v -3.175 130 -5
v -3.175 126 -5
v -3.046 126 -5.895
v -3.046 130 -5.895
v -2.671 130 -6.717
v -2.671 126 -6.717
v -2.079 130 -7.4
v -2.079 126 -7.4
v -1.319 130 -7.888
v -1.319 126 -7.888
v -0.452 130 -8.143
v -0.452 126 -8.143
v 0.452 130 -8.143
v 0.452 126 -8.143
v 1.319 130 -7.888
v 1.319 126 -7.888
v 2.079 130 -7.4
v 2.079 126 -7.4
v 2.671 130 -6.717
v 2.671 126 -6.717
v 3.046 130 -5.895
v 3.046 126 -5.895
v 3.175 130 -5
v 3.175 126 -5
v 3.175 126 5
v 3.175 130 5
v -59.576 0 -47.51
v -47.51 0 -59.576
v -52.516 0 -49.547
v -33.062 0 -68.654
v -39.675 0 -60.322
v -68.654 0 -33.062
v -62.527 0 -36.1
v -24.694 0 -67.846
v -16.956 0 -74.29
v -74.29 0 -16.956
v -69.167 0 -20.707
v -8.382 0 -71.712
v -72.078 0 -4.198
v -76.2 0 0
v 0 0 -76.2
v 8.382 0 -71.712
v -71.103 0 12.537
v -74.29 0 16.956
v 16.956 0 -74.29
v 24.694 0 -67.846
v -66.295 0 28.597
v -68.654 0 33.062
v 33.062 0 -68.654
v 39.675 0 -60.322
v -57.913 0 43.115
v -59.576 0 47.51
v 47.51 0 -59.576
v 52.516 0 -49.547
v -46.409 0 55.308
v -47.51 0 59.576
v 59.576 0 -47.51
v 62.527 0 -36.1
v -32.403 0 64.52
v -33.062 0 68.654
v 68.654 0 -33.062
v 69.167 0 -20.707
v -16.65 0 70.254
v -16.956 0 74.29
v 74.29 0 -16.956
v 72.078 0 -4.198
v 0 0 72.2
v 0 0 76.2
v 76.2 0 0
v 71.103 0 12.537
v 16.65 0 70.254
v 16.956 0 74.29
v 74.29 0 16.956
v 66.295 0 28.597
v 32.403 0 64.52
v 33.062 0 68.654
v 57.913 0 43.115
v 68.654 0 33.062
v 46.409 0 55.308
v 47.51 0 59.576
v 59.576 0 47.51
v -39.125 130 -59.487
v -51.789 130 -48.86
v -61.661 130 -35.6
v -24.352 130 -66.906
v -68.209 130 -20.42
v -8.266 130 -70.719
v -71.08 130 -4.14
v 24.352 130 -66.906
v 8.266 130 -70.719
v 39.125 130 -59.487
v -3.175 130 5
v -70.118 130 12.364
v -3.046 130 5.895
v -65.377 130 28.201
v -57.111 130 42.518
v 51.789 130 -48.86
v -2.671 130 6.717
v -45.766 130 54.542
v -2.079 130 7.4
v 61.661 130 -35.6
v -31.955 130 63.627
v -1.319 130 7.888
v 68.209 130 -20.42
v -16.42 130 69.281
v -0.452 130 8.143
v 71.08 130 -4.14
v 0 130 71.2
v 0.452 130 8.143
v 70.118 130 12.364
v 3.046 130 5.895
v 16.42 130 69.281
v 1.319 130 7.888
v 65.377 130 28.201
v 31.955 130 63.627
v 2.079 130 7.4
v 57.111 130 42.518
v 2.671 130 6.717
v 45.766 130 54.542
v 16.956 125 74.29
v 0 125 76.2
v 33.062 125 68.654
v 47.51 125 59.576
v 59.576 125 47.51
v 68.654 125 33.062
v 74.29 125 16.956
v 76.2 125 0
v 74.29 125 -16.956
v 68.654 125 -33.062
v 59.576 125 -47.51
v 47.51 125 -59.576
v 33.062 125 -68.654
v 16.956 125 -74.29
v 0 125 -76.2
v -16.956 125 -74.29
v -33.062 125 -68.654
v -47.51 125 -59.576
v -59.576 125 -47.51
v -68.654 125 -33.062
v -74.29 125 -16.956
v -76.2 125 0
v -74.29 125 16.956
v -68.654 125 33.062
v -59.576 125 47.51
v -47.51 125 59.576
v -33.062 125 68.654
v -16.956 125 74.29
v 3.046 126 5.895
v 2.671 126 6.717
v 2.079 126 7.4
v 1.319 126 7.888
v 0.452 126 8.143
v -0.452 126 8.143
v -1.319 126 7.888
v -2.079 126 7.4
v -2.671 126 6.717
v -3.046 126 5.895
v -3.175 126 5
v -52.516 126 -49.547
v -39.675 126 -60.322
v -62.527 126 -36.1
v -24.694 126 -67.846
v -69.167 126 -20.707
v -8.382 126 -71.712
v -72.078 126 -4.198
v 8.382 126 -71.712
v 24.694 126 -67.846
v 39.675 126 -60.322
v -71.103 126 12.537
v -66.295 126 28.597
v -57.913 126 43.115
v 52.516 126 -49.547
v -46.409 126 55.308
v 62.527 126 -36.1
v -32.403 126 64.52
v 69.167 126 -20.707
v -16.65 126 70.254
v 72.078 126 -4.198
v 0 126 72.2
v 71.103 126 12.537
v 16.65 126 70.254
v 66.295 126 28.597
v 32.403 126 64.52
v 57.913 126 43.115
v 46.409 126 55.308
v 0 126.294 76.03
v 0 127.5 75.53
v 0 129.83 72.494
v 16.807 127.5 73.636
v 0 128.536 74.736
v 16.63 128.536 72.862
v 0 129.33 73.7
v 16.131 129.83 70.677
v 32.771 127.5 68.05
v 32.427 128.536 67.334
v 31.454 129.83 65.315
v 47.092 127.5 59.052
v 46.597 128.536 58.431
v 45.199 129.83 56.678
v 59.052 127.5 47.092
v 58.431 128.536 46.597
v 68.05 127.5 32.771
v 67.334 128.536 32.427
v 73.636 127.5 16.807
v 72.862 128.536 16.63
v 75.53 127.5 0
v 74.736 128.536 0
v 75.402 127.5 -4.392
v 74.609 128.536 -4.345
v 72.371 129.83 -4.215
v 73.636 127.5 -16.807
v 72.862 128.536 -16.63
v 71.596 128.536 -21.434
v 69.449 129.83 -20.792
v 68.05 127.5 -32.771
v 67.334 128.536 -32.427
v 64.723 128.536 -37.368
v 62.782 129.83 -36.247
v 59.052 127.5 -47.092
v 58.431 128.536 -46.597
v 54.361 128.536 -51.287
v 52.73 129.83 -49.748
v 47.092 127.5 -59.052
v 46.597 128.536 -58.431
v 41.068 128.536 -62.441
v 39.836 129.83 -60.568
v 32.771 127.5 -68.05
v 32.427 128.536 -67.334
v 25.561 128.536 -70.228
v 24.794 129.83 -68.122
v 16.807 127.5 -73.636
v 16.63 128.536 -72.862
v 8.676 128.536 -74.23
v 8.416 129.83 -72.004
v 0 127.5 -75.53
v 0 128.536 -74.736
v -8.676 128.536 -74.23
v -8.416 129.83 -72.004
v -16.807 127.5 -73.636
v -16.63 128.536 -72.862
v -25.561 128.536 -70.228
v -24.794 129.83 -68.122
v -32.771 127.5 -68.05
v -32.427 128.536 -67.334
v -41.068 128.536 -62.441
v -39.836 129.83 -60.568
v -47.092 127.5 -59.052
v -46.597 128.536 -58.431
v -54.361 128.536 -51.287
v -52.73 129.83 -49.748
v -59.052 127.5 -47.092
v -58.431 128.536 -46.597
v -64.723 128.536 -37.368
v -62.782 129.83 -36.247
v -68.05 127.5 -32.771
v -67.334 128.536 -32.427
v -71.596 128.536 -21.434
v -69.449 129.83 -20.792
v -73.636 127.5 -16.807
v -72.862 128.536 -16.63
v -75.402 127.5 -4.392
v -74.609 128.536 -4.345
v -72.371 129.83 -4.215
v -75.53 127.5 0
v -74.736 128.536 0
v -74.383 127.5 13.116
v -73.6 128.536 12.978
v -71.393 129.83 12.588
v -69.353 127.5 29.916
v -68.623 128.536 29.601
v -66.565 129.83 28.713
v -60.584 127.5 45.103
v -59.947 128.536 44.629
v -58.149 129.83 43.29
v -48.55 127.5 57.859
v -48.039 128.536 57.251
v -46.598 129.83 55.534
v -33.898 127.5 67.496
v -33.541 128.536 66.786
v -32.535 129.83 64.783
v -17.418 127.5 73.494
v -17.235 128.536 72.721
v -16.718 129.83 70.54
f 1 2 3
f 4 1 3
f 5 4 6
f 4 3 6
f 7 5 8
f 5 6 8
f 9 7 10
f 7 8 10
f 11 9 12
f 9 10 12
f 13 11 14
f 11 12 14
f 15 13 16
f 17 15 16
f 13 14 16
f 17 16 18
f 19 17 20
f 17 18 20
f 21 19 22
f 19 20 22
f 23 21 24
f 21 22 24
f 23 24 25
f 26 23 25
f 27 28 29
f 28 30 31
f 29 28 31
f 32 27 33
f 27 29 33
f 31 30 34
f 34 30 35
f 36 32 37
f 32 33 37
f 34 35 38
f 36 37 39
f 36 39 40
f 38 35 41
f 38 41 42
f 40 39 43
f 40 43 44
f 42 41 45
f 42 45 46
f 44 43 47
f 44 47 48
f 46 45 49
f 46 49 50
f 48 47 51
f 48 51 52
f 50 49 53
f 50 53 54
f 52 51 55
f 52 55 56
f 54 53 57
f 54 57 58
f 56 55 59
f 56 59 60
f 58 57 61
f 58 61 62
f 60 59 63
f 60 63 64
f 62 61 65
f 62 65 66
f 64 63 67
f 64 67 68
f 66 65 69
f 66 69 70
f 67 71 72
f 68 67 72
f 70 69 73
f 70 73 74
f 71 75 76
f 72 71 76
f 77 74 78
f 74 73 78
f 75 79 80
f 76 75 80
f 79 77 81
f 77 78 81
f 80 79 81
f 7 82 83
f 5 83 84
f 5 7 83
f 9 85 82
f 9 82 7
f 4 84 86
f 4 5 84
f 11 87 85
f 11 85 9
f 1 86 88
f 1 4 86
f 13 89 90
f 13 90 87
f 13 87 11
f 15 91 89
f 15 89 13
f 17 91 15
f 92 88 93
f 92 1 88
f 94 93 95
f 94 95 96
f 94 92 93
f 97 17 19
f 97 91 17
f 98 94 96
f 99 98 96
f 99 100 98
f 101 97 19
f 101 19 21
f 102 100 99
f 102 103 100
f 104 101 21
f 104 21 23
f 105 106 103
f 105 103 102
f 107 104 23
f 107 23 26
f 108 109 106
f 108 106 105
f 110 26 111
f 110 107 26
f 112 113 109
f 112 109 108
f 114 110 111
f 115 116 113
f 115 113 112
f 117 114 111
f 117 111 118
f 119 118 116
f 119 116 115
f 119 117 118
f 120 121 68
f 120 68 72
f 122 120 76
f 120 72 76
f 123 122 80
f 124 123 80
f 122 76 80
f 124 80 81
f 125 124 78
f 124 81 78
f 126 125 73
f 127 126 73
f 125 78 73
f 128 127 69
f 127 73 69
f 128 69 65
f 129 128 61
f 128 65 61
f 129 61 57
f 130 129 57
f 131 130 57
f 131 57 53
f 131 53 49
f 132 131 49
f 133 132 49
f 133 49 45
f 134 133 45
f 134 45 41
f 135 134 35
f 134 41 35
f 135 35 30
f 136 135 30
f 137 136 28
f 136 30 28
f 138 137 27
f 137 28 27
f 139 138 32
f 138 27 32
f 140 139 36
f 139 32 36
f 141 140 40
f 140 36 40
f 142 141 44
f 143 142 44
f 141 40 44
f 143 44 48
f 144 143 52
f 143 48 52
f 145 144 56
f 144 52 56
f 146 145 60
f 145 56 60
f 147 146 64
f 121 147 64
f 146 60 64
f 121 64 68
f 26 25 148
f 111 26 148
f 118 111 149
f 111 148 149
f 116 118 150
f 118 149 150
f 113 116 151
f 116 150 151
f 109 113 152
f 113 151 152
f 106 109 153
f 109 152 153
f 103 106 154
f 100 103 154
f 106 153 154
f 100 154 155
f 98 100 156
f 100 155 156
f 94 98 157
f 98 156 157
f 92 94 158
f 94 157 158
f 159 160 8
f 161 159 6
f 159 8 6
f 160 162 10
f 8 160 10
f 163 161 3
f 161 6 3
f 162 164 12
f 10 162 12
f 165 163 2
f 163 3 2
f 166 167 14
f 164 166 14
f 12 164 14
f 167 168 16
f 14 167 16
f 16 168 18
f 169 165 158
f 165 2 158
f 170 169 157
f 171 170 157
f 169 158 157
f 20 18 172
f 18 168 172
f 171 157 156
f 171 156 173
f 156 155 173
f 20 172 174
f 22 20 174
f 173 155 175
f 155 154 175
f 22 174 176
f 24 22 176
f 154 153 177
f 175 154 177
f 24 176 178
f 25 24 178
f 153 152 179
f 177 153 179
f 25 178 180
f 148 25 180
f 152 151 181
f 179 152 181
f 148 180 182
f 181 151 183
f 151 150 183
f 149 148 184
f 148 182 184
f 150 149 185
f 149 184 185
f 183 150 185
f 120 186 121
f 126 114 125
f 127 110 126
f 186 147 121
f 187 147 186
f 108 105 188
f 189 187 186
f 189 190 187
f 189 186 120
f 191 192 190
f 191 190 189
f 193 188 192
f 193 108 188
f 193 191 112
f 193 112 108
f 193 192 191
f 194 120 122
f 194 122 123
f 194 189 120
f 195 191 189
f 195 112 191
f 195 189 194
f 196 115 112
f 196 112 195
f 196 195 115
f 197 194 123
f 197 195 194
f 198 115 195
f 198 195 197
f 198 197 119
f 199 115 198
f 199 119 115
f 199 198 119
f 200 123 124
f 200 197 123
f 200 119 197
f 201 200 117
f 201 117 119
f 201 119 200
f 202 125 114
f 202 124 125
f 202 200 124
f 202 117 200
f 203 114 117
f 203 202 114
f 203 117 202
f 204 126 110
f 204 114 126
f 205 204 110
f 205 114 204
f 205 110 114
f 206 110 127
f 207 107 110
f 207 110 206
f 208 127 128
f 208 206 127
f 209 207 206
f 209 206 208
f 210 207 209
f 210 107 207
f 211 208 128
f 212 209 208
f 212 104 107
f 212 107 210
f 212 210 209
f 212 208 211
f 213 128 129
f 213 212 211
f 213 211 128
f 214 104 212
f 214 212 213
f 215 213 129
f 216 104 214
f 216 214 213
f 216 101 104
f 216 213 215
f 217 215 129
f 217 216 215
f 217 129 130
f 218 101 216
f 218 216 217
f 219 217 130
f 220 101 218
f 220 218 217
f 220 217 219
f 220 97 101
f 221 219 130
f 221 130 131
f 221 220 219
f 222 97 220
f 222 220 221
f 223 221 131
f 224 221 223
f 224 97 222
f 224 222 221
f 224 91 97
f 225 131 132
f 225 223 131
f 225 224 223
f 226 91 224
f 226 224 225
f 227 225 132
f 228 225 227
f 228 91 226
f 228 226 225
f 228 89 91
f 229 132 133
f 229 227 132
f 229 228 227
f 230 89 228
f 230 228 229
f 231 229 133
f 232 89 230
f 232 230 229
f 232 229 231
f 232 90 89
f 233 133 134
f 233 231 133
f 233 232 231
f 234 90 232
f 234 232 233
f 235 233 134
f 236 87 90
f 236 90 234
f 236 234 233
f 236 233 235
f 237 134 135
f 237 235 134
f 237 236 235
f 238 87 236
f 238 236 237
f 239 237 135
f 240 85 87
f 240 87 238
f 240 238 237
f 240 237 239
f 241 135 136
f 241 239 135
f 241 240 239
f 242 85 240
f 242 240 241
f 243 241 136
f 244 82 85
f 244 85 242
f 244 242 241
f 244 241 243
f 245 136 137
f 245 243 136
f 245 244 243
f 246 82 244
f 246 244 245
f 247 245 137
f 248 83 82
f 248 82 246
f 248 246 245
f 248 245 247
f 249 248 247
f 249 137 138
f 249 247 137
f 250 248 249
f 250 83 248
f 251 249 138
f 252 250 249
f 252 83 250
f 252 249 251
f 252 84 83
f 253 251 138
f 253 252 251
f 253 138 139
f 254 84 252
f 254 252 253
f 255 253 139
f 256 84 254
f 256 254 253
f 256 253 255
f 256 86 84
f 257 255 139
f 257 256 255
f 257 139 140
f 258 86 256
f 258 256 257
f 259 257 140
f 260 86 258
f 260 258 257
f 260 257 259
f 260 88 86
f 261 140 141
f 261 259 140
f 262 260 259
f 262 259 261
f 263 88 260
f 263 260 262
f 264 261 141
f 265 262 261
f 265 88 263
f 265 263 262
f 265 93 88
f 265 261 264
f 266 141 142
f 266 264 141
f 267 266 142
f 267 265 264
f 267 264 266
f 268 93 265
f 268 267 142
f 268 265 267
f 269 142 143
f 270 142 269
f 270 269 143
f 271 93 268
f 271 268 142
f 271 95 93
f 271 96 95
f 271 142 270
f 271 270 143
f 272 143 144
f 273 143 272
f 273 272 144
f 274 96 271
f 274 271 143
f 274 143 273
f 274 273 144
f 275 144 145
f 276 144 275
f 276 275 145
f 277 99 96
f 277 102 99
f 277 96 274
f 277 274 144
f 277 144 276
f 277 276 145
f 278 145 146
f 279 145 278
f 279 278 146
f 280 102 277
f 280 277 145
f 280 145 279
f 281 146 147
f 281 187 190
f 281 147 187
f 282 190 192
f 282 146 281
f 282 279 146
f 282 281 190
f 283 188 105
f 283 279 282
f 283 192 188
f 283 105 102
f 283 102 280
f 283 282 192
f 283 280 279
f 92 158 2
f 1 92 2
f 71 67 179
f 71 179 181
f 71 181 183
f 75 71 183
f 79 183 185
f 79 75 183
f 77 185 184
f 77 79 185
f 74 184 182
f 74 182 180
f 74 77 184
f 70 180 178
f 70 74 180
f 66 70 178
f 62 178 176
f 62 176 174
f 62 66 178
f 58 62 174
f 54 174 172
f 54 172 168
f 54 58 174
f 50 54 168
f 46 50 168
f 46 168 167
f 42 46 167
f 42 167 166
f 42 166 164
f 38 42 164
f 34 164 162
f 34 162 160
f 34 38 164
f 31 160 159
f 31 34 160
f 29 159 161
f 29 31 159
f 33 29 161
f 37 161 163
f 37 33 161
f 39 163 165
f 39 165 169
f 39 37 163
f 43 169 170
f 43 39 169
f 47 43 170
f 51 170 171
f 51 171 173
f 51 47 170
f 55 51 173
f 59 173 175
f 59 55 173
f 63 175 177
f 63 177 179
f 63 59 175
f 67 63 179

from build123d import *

# Parameters (mm, degrees)
SKETCH1_R           = 76.2
BOSS_EXTRUDE1_DEPTH = 130
SKETCH1_3_R         = 72.2
CUT_EXTRUDE1_DEPTH  = 126
FILLET1_R           = 5


with BuildPart() as part:
    # Sketch1 → Boss-Extrude1 (new body)
    with BuildSketch(Plane(origin=(0, 0, 0), x_dir=(1, 0, 0), z_dir=(0, 1, 0))):
        with Locations(Location((0, 0, 0), (0, 0, 270))):
            Circle(SKETCH1_R)
        with BuildLine():
            Line((-3.175, -5), (-3.175, 5))
            ThreePointArc((-3.175, 5), (0, 8.175), (3.175, 5))
            Line((3.175, 5), (3.175, -5))
            ThreePointArc((3.175, -5), (0, -8.175), (-3.175, -5))
        make_face(mode=Mode.SUBTRACT)
    extrude(amount=BOSS_EXTRUDE1_DEPTH)

    # Sketch1<3> → Cut-Extrude1 (cut)
    with BuildSketch(Plane(origin=(0, 0, 0), x_dir=(1, 0, 0), z_dir=(0, 1, 0))):
        with Locations(Location((0, 0, 0), (0, 0, 270))):
            Circle(SKETCH1_3_R)
    extrude(amount=CUT_EXTRUDE1_DEPTH, mode=Mode.SUBTRACT)

    # Fillet1
    fillet1_edges = [part.edges().sort_by_distance(p)[0] for p in [
        (0, 130, -76.2),
    ]]
    fillet(fillet1_edges, radius=FILLET1_R)


solid = part.part
